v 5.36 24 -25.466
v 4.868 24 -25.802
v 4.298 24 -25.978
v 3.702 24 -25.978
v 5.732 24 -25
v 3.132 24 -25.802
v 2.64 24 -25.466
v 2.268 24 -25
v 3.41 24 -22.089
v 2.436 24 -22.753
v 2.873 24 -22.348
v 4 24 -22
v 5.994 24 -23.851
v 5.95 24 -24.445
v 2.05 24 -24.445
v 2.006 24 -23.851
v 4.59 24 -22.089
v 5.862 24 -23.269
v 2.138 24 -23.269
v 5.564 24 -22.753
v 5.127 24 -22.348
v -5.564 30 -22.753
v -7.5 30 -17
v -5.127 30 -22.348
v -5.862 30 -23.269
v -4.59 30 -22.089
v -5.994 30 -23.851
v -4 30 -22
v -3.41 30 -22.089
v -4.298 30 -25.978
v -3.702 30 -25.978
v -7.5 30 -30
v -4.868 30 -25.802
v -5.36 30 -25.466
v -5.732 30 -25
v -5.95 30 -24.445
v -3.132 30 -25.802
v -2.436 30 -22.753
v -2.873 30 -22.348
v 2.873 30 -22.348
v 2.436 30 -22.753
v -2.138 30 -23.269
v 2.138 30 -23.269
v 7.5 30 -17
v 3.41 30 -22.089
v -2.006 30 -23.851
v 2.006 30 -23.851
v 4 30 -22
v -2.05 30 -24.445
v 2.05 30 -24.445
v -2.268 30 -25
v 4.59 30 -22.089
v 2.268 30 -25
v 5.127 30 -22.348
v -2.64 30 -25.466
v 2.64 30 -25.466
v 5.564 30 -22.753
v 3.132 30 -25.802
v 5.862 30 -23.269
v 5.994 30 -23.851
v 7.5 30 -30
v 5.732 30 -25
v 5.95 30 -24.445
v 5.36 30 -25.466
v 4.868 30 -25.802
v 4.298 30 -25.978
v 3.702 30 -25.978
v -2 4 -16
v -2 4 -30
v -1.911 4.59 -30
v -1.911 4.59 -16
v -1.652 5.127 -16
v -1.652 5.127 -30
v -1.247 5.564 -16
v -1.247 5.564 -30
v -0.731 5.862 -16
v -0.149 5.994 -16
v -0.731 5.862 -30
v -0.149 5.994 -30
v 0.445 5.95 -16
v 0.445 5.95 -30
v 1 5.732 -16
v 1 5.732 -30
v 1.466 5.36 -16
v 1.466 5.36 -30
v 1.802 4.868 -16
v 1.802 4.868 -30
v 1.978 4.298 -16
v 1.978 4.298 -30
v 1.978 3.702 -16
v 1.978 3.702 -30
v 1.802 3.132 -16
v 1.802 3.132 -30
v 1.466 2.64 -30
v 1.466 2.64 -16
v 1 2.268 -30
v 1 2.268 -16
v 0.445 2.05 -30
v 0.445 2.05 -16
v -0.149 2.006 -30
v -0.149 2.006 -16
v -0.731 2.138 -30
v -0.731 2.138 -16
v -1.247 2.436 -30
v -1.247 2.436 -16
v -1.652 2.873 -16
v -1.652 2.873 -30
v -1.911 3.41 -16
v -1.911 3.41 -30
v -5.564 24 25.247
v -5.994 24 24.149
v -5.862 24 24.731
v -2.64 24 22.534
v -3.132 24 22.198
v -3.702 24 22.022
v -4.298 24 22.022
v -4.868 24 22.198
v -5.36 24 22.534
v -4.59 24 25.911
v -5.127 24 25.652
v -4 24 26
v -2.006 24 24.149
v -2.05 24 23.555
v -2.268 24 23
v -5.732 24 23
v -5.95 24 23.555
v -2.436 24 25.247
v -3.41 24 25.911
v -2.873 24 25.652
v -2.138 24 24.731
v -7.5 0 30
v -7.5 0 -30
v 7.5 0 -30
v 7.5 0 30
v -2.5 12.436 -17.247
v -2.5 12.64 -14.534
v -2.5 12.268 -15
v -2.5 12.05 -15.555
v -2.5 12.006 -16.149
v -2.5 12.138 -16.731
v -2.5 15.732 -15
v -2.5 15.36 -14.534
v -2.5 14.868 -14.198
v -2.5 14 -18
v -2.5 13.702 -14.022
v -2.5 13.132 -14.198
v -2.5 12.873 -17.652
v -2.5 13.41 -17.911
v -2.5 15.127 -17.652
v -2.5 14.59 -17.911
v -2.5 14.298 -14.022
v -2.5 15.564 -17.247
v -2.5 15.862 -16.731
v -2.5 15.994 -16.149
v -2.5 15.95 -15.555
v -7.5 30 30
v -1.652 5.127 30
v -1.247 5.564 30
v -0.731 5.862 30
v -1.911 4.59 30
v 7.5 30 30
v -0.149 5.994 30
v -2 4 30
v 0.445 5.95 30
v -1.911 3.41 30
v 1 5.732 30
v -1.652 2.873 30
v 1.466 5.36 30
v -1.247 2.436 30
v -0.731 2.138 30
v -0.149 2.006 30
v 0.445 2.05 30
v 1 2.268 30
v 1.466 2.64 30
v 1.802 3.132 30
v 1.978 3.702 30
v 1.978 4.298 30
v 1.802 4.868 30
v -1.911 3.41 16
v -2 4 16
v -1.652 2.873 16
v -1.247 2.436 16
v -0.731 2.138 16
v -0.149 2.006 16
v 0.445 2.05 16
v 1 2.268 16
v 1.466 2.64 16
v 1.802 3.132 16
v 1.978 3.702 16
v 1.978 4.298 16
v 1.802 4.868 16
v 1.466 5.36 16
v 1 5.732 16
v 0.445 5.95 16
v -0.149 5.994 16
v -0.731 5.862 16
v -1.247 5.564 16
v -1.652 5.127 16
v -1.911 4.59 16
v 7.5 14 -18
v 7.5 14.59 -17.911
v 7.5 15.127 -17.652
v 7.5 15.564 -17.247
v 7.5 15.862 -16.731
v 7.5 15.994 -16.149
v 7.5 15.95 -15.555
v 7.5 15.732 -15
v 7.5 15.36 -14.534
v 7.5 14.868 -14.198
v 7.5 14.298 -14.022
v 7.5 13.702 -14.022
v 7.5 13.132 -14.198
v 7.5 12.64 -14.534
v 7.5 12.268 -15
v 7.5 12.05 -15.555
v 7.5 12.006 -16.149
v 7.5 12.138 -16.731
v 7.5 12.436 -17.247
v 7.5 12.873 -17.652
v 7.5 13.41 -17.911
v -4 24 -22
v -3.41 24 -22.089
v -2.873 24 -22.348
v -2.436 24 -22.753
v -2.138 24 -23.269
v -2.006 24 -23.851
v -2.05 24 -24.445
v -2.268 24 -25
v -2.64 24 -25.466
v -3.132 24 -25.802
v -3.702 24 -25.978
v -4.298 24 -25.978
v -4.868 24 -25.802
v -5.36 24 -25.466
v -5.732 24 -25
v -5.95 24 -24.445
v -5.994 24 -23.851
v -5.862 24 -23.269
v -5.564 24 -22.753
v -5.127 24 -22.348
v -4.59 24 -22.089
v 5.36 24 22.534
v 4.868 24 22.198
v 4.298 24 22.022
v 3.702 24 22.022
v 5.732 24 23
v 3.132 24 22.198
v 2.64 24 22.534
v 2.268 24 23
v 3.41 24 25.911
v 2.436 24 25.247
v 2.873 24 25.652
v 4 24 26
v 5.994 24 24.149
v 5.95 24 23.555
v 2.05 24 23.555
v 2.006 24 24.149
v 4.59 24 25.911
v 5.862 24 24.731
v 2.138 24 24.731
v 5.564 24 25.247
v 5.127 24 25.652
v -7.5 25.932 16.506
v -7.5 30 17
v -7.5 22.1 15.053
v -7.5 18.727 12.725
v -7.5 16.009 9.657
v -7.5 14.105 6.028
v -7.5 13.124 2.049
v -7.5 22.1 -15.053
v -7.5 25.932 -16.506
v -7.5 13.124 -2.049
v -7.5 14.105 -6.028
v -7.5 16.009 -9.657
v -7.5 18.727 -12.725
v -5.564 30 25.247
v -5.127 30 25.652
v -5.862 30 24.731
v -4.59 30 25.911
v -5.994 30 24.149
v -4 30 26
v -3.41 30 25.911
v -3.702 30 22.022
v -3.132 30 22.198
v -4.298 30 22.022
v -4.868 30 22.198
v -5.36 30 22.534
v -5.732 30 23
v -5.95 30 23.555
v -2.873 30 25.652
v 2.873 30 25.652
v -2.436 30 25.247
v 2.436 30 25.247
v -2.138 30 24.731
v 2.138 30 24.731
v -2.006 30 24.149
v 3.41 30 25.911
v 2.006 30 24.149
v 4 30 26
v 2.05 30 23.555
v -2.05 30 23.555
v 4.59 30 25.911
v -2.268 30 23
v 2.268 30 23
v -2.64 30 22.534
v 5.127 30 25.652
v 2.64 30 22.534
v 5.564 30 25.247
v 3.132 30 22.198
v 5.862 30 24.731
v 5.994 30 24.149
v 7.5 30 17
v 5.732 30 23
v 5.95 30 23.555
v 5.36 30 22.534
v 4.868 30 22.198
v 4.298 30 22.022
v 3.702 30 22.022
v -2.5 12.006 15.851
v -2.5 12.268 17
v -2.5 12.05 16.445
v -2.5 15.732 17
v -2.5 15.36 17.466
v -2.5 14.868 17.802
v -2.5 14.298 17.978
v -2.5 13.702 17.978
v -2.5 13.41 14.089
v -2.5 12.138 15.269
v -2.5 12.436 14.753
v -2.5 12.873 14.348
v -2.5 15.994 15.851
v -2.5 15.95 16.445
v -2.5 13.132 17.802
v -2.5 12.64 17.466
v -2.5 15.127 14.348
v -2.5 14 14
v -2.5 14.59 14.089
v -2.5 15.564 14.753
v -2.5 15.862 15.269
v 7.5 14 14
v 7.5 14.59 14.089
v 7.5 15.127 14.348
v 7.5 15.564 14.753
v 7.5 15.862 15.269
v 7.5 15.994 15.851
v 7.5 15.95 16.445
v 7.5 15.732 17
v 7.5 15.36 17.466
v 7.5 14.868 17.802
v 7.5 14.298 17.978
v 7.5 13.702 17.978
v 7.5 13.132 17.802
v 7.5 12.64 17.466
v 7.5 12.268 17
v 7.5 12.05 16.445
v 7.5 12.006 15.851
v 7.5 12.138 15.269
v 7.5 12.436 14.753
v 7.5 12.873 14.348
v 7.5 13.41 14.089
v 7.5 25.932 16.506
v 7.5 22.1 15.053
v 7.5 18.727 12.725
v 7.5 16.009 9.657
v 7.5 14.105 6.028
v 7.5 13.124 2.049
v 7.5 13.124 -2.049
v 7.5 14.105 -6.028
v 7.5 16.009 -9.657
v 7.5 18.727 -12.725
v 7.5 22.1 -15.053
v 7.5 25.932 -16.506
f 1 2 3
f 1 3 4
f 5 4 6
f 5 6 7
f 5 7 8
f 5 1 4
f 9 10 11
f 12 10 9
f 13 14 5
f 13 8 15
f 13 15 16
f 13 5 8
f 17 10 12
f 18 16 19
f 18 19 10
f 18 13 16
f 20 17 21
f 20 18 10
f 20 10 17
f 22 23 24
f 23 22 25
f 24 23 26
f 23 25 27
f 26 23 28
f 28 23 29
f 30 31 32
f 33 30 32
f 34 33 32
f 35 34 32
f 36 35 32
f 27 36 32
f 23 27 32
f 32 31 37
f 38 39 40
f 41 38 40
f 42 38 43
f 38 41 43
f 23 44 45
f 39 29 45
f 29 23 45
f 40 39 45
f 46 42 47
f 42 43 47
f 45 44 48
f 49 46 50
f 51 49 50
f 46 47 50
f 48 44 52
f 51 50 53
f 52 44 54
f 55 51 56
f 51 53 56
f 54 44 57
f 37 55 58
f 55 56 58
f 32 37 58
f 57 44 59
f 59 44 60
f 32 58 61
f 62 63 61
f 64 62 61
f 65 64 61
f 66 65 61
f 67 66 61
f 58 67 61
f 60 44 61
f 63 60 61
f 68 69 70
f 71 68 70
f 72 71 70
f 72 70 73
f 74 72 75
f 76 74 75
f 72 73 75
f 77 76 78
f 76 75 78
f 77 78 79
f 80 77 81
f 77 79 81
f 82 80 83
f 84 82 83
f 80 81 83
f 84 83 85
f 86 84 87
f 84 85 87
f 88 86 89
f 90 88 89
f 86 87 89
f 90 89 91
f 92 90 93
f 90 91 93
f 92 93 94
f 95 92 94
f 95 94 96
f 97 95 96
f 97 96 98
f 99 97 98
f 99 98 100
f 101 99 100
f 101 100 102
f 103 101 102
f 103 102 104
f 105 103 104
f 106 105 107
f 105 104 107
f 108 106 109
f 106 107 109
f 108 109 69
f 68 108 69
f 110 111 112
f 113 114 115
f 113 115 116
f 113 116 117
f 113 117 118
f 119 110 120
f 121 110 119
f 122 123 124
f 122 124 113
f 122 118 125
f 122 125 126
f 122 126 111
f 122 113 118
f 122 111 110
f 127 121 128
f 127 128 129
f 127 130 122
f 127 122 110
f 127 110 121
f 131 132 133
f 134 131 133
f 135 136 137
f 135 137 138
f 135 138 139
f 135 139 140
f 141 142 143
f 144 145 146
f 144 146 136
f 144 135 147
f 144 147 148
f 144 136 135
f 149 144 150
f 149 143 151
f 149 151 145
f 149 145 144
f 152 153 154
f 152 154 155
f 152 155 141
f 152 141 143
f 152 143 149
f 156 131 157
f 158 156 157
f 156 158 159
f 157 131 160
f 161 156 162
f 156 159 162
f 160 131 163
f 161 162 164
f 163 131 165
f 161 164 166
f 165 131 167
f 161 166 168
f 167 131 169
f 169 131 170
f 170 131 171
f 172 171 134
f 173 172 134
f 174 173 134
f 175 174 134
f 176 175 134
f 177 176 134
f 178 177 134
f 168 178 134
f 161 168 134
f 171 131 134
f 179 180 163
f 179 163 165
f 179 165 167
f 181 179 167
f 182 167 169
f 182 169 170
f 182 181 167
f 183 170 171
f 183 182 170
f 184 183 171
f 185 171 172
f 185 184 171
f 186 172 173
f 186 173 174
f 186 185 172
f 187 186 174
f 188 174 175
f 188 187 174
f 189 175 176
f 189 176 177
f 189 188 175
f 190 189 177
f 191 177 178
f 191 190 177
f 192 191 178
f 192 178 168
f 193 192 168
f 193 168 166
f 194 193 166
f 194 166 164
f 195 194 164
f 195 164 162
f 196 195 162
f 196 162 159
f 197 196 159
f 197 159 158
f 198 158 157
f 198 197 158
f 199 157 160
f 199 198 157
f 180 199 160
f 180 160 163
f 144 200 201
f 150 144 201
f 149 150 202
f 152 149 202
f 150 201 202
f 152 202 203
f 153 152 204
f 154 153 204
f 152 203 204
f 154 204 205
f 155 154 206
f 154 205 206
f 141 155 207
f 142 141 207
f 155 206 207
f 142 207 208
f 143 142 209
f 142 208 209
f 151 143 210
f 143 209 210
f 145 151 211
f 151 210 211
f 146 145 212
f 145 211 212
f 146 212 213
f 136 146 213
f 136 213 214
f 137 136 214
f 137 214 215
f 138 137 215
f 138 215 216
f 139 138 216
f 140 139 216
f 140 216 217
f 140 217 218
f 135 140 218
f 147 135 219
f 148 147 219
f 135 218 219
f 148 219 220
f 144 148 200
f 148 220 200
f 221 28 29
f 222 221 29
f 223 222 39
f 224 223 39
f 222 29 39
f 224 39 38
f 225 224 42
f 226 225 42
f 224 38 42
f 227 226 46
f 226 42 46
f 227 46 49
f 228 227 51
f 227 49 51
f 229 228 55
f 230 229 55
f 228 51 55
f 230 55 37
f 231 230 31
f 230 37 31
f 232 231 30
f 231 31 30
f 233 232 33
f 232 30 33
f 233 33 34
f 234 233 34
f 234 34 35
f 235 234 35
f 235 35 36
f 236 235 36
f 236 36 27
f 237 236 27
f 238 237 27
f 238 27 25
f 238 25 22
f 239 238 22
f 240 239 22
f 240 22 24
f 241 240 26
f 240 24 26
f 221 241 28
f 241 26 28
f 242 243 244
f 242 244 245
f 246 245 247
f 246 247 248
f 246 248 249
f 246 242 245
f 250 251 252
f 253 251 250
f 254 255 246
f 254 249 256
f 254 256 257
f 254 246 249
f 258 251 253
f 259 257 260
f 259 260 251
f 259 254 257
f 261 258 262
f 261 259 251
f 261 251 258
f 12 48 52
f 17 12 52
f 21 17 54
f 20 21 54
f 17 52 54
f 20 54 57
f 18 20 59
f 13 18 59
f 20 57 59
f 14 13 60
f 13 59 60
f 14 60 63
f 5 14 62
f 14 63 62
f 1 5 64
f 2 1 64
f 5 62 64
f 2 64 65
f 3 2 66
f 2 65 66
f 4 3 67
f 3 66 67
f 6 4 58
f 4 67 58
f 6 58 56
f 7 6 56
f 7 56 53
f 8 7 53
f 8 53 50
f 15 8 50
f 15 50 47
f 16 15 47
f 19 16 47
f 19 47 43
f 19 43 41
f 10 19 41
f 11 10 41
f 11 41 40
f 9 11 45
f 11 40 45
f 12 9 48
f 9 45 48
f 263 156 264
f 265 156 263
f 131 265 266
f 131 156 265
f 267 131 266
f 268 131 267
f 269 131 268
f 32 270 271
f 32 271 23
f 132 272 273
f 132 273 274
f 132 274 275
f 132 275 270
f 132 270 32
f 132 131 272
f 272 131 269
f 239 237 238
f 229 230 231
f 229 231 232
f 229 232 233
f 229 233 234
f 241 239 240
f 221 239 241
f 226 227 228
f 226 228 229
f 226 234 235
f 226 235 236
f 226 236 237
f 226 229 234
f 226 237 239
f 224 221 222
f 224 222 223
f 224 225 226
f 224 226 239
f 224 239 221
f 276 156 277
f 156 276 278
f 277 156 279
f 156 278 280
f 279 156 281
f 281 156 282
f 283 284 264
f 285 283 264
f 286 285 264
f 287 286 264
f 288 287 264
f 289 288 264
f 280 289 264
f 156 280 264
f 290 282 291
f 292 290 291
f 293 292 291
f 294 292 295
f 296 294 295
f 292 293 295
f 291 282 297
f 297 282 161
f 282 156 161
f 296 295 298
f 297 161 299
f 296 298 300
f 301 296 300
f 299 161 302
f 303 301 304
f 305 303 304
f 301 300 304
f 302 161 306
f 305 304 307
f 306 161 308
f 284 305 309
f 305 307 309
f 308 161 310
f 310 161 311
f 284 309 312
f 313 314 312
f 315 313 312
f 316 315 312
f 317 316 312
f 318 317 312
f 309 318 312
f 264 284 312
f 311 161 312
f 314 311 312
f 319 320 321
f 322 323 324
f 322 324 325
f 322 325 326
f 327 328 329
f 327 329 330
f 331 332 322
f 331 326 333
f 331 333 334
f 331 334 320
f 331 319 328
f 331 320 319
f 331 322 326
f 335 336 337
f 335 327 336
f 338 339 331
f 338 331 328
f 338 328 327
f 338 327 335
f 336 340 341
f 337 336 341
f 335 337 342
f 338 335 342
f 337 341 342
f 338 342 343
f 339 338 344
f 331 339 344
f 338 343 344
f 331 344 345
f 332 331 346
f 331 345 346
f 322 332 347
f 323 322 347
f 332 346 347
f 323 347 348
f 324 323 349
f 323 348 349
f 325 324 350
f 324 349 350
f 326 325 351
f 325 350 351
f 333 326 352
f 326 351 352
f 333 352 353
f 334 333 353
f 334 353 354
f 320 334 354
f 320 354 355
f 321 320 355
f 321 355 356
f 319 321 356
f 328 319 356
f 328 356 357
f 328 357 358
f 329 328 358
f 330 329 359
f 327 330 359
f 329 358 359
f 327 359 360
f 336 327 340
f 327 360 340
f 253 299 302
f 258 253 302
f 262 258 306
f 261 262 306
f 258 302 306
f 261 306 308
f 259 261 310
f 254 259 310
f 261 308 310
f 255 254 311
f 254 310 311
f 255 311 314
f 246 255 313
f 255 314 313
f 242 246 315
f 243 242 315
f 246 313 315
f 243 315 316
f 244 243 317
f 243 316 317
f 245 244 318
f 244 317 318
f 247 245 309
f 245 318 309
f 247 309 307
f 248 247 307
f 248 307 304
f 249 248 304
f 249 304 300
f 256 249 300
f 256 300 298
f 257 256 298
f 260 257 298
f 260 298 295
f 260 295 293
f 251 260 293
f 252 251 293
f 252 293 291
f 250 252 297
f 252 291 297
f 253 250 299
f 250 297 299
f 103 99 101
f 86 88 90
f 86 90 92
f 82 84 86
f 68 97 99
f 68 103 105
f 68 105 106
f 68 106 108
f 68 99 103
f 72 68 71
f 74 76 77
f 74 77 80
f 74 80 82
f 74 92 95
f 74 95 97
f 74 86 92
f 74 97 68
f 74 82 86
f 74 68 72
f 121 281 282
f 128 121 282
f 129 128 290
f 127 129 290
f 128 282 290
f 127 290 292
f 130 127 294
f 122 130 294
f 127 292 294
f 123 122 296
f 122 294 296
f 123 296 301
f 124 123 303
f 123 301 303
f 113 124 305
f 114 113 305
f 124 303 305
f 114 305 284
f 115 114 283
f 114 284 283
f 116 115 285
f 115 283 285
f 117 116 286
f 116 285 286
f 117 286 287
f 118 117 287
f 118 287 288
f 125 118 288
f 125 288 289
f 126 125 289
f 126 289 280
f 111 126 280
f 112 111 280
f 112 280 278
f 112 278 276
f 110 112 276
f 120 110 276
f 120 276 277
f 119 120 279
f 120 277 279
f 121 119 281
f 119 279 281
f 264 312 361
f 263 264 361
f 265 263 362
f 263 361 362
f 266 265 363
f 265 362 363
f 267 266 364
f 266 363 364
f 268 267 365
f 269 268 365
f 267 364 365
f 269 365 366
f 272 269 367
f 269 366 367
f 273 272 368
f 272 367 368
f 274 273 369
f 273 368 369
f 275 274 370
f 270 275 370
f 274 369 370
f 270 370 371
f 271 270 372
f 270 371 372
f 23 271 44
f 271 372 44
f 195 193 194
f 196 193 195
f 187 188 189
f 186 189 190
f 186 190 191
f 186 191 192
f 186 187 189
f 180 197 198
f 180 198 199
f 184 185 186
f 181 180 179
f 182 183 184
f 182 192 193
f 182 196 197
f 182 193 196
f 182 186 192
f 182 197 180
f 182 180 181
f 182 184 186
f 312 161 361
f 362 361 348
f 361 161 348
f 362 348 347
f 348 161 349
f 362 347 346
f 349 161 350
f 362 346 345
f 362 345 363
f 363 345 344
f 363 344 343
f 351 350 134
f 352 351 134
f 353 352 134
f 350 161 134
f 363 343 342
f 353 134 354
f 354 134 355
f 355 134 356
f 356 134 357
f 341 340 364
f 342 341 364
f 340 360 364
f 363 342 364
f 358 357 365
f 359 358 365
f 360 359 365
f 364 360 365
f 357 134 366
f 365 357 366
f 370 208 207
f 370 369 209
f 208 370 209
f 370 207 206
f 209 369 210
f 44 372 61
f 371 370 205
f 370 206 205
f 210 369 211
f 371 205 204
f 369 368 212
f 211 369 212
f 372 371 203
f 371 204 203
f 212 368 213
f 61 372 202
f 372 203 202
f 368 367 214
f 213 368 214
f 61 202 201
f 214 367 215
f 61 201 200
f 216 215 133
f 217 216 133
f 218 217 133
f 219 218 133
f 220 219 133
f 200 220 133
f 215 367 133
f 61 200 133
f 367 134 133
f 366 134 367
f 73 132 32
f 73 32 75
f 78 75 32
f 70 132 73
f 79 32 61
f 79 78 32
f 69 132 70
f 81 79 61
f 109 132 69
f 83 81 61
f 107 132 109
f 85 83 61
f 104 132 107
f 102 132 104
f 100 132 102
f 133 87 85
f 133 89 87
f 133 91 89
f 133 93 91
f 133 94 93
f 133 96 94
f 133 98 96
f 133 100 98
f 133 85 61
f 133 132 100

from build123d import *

# Parameters (mm, degrees)
SKETCH1_W           = 15
SKETCH1_H           = 60
BOSS_EXTRUDE1_DEPTH = 70
SKETCH2_R           = 17
CUT_EXTRUDE1_DEPTH  = 70
SKETCH3_W           = 60
SKETCH3_H           = 40
CUT_EXTRUDE2_DEPTH  = 29
SKETCH4_R           = 2
CUT_EXTRUDE3_DEPTH  = 6
SKETCH5_R           = 2
CUT_EXTRUDE4_DEPTH  = 10
SKETCH6_R           = 2
CUT_EXTRUDE5_DEPTH  = 14
CUT_EXTRUDE6_START  = -14
SKETCH7_R           = 2
CUT_EXTRUDE6_DEPTH  = 14


with BuildPart() as part:
    # Sketch1 → Boss-Extrude1 (new body)
    with BuildSketch(Plane(origin=(0, 0, 0), x_dir=(1, 0, 0), z_dir=(0, 1, 0))):
        Rectangle(SKETCH1_W, SKETCH1_H)
    extrude(amount=BOSS_EXTRUDE1_DEPTH)

    # Sketch2 → Cut-Extrude1 (cut)
    with BuildSketch(Plane(origin=(7.5, 0, 0), x_dir=(0, 0, -1), z_dir=(1, 0, 0))):
        with Locations((0, 30)):
            Circle(SKETCH2_R)
    extrude(amount=-CUT_EXTRUDE1_DEPTH, mode=Mode.SUBTRACT)

    # Sketch3 → Cut-Extrude2 (cut)
    with BuildSketch(Plane(origin=(7.5, 0, 0), x_dir=(0, 0, -1), z_dir=(1, 0, 0))):
        with Locations((0, 50)):
            Rectangle(SKETCH3_W, SKETCH3_H)
    extrude(amount=-CUT_EXTRUDE2_DEPTH, mode=Mode.SUBTRACT)

    # Sketch4 → Cut-Extrude3 (cut)
    with BuildSketch(Plane(origin=(0, 30, 0), x_dir=(1, 0, 0), z_dir=(0, 1, 0))):
        with Locations(Location((-4, 24, 0), (0, 0, 270))):
            Circle(SKETCH4_R)
        with Locations(Location((4, 24, 0), (0, 0, 270))):
            Circle(SKETCH4_R)
        with Locations(Location((-4, -24, 0), (0, 0, 270))):
            Circle(SKETCH4_R)
        with Locations(Location((4, -24, 0), (0, 0, 270))):
            Circle(SKETCH4_R)
    extrude(amount=-CUT_EXTRUDE3_DEPTH, mode=Mode.SUBTRACT)

    # Sketch5 → Cut-Extrude4 (cut)
    with BuildSketch(Plane(origin=(7.5, 0, 0), x_dir=(0, 0, -1), z_dir=(1, 0, 0))):
        with Locations((-16, 14)):
            Circle(SKETCH5_R)
        with Locations((16, 14)):
            Circle(SKETCH5_R)
    extrude(amount=-CUT_EXTRUDE4_DEPTH, mode=Mode.SUBTRACT)

    # Sketch6 → Cut-Extrude5 (cut)
    with BuildSketch(Plane(origin=(0, 0, -30), x_dir=(-1, 0, 0), z_dir=(0, 0, -1))):
        with Locations((0, 4)):
            Circle(SKETCH6_R)
    extrude(amount=-CUT_EXTRUDE5_DEPTH, mode=Mode.SUBTRACT)

    # Sketch7 → Cut-Extrude6 (cut)
    with BuildSketch(Plane.XY.offset(30).offset(CUT_EXTRUDE6_START)):
        with Locations(Location((0, 4, 0), (0, 0, 180))):
            Circle(SKETCH7_R)
    extrude(amount=CUT_EXTRUDE6_DEPTH, mode=Mode.SUBTRACT)


solid = part.part
